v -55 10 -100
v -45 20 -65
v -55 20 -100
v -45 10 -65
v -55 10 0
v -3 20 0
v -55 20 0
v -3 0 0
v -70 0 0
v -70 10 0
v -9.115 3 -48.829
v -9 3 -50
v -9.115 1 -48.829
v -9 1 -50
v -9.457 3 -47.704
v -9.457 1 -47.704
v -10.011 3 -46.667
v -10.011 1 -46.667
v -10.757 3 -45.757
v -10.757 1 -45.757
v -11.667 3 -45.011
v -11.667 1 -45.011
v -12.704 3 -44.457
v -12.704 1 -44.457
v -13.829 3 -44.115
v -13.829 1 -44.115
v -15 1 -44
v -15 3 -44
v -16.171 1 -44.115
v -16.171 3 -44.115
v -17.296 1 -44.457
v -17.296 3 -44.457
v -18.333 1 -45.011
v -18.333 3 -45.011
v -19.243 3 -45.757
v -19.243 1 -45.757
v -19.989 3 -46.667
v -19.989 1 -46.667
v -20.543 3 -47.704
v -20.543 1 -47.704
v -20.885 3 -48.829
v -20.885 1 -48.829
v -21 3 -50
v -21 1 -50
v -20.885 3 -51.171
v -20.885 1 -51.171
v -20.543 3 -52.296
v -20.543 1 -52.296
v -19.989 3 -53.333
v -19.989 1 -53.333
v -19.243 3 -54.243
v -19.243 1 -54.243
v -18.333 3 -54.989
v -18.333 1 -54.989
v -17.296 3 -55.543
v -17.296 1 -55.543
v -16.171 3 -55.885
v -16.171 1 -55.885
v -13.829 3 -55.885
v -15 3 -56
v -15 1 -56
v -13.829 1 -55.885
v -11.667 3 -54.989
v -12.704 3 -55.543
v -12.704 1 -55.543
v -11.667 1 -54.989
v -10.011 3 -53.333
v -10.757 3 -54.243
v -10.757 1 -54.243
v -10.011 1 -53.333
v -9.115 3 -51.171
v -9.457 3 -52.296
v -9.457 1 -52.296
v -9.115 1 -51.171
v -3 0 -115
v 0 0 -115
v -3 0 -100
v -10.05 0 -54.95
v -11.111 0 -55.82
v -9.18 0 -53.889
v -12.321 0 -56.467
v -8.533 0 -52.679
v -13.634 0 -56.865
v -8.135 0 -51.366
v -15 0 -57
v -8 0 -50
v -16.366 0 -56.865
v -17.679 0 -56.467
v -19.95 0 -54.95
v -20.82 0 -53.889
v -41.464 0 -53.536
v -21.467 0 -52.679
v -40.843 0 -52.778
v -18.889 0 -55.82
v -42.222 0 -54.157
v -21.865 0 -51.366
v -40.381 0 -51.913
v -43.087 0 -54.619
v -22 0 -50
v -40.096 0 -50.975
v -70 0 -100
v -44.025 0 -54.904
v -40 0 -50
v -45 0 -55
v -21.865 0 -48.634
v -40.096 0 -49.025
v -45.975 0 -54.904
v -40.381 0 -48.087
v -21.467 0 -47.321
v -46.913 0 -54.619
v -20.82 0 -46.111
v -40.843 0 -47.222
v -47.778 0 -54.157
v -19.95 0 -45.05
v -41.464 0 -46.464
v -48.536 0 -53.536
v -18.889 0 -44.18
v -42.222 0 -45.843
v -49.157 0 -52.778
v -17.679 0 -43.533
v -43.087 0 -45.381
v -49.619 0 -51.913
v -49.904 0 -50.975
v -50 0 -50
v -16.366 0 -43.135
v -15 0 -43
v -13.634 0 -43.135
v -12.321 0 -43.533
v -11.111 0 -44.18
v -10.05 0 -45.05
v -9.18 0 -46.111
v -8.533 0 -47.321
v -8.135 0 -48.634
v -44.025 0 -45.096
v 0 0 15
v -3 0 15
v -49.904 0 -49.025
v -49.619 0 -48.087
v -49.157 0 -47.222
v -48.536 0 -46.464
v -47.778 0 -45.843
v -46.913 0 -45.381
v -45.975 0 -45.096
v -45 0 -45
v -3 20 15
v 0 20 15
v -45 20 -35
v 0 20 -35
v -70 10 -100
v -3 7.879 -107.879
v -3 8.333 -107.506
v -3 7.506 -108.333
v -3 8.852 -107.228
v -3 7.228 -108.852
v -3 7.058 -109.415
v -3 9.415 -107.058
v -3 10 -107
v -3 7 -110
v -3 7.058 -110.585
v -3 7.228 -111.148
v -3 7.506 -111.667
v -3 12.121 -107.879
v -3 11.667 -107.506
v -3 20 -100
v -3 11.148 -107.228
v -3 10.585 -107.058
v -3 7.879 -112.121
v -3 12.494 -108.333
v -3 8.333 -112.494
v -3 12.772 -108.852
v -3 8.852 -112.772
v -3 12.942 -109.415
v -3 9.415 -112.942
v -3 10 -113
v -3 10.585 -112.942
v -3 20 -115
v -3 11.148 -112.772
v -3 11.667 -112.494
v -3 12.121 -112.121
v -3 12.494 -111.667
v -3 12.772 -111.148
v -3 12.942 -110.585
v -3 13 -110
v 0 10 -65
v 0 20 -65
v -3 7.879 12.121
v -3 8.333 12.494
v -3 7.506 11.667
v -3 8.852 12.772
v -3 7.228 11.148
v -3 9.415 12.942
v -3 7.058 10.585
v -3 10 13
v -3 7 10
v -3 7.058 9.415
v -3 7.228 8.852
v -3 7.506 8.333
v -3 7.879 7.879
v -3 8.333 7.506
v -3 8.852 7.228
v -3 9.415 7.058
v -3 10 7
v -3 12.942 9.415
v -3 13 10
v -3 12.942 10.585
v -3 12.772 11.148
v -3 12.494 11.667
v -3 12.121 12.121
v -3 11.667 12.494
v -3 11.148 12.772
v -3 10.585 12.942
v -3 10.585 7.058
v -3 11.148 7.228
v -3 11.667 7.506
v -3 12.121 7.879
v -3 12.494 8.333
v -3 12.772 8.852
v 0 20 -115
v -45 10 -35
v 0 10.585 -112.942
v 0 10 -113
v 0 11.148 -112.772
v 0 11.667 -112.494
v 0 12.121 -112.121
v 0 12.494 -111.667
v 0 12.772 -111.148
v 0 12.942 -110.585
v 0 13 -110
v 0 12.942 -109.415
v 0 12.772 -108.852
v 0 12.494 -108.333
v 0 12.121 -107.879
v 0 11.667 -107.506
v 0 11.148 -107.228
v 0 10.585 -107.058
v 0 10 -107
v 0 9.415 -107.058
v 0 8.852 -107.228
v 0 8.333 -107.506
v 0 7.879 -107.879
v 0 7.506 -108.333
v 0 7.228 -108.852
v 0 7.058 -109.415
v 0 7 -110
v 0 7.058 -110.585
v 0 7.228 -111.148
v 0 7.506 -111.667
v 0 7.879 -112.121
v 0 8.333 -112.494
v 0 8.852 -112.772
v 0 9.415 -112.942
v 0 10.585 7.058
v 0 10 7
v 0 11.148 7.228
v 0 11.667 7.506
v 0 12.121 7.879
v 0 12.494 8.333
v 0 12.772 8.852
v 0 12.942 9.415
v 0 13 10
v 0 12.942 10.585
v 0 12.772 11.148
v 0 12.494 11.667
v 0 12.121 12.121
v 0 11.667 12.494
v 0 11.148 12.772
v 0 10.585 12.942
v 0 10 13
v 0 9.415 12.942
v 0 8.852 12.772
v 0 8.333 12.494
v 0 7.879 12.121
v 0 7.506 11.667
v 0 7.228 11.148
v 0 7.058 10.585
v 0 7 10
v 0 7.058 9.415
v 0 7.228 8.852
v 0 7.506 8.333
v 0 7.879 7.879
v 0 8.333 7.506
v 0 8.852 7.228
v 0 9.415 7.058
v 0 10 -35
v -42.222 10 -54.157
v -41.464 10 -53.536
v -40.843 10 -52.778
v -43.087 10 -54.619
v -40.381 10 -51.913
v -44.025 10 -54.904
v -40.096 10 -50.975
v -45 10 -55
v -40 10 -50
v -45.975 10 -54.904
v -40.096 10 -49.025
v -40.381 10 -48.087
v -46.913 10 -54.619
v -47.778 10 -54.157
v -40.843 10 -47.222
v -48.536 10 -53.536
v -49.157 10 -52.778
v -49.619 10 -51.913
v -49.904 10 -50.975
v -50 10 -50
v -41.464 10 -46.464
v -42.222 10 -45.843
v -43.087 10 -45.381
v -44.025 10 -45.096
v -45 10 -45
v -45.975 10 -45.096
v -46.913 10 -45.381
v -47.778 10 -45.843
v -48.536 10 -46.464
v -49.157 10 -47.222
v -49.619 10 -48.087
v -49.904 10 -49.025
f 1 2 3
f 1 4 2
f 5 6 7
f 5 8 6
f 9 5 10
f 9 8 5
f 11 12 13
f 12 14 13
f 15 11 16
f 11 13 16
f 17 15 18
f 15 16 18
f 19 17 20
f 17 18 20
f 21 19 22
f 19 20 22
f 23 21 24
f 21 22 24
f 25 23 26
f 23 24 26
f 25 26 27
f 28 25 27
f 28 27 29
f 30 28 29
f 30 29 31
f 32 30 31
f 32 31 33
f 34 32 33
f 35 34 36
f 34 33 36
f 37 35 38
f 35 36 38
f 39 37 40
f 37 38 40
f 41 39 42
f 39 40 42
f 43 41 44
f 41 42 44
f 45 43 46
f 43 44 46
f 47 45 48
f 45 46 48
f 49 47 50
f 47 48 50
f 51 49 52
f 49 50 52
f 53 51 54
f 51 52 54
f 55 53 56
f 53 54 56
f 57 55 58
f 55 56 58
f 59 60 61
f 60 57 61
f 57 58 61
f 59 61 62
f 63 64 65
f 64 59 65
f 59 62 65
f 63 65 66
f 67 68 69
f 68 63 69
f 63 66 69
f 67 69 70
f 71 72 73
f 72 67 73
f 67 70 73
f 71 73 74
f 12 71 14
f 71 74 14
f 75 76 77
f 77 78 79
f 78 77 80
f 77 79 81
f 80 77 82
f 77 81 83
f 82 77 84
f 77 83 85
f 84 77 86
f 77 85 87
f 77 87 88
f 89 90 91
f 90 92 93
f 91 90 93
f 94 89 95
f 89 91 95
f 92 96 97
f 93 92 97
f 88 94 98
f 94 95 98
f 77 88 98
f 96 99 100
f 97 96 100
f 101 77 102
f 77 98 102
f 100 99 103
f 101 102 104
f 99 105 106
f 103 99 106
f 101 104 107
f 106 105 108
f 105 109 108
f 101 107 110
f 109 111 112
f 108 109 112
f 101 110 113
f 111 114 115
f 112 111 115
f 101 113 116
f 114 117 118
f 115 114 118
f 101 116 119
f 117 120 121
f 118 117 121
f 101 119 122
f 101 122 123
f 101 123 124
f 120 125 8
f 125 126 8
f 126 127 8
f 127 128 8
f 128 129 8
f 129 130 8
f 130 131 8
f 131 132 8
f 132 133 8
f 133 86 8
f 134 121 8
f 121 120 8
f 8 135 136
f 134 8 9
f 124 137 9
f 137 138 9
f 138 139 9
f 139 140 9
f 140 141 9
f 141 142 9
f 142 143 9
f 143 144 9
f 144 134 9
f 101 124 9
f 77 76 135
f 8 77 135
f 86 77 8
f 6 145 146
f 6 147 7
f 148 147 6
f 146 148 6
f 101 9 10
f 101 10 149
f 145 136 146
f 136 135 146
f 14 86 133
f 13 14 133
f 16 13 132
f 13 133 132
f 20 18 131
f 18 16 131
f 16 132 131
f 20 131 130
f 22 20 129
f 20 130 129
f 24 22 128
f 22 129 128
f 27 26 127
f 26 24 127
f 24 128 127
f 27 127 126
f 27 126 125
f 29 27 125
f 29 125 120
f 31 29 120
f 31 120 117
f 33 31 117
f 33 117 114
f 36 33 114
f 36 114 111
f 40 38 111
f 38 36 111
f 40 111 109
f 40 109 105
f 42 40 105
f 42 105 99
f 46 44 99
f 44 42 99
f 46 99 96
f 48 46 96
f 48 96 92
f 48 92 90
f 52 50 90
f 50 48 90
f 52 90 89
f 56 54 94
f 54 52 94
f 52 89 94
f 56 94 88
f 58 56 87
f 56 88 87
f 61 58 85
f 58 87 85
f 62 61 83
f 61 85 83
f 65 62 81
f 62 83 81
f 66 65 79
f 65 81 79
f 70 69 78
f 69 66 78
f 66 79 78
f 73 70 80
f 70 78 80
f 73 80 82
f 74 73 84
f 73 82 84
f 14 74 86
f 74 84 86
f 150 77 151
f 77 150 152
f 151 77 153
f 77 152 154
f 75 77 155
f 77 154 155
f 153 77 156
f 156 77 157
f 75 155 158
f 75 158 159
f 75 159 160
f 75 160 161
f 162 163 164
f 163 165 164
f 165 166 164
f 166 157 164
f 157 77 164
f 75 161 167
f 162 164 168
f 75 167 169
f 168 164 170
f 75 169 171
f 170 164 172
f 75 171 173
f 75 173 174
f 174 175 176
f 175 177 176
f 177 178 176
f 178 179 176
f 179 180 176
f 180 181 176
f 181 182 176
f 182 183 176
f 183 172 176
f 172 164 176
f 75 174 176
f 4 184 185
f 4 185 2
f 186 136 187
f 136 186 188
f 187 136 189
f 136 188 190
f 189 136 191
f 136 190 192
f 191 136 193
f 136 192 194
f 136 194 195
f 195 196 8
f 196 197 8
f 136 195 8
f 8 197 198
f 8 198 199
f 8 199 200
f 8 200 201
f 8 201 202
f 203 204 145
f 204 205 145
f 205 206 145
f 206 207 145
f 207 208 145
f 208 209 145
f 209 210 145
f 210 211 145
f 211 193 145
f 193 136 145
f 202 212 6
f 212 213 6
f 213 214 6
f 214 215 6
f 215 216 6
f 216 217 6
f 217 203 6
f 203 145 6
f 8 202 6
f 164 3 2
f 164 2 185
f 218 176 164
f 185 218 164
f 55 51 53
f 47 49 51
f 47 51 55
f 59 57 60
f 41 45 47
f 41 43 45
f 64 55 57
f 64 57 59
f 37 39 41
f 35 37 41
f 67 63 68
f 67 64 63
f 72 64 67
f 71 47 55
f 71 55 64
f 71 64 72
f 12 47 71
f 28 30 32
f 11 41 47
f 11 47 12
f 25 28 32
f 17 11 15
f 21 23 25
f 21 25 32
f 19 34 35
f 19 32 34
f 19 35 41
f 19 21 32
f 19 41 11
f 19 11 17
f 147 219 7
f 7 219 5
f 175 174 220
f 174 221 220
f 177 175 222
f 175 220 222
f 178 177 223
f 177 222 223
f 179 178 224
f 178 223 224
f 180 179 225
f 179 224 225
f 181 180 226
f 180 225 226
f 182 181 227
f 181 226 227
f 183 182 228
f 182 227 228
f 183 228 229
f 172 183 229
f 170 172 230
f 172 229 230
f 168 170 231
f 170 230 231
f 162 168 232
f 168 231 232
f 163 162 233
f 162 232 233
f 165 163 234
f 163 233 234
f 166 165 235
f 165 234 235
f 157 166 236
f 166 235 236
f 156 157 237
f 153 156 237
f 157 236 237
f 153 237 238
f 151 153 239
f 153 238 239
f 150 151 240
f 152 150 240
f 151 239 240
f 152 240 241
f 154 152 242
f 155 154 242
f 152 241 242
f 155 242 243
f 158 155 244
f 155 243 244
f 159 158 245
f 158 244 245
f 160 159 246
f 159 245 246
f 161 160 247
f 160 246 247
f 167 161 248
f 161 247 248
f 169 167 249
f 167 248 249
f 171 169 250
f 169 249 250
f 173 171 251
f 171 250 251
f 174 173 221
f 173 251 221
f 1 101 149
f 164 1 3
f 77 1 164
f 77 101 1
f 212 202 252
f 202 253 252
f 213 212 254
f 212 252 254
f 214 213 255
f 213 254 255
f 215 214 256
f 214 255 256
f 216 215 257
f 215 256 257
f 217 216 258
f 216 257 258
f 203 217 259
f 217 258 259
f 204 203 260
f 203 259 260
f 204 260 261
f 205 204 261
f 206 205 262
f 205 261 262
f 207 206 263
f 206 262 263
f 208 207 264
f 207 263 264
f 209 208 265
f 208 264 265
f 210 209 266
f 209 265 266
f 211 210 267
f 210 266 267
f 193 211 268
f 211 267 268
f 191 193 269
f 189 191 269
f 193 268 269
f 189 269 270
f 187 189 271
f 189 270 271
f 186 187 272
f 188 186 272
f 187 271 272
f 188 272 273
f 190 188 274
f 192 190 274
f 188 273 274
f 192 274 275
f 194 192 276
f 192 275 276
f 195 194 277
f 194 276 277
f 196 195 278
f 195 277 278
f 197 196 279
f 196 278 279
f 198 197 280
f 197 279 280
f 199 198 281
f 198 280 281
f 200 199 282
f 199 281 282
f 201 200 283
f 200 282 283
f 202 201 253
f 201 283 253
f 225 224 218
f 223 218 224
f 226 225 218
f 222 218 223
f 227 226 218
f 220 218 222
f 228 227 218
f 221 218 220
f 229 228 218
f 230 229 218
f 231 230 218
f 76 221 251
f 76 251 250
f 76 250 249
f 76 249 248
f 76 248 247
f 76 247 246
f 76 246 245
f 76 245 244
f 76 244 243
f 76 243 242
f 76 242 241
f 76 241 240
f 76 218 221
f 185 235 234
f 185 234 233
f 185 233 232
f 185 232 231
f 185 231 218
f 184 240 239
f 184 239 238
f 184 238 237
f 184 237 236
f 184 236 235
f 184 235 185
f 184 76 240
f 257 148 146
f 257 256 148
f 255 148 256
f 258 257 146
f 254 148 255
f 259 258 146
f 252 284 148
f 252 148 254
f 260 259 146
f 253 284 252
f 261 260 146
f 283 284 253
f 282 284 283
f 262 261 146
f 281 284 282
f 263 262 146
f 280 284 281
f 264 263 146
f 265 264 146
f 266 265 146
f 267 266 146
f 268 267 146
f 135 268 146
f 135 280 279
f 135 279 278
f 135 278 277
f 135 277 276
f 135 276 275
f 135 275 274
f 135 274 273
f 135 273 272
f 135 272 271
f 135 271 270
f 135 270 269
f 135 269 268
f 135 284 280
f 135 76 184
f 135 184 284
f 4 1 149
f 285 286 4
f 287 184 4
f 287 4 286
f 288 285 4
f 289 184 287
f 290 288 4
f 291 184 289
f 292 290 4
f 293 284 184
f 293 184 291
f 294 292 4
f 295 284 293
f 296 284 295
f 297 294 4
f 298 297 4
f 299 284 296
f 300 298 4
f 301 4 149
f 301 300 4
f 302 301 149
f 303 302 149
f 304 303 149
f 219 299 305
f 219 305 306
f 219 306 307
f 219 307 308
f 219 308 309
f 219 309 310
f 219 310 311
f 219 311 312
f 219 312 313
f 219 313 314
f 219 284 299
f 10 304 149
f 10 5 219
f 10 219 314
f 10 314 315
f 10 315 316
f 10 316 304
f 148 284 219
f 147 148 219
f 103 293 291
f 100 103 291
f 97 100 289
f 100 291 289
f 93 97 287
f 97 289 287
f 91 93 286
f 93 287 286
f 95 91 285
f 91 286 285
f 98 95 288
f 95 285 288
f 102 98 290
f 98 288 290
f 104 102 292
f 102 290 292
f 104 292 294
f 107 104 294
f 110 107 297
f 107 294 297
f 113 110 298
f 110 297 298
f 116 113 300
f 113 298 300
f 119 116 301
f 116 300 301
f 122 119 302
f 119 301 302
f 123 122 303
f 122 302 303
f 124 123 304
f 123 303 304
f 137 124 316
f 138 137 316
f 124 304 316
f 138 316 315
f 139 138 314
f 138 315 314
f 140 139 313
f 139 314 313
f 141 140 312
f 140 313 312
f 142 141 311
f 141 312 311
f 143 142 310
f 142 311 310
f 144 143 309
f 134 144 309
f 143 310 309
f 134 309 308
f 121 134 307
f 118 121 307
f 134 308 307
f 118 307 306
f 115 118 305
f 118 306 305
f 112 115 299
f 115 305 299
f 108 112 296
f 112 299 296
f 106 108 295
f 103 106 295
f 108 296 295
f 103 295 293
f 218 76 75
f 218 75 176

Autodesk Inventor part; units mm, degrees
ref_plane "YZ Plane" through (0, 0, 0) normal (1, 0, 0) x (0, 1, 0)
ref_plane "XZ Plane" through (0, 0, 0) normal (0, 1, 0) x (-1, 0, 0)
ref_plane "XY Plane" through (0, 0, 0) normal (0, 0, 1) x (1, 0, 0)
sketch "Эскиз1" plane through (0, 0, 0) normal (0, 1, 0) x (-1, 0, 0)
  line L0 (0, 0) -> (70, 0)
  line L1 (70, 0) -> (70, -100)
  line L2 (70, -100) -> (0, -100)
  line L3 (0, -100) -> (0, 0)
  dimension "d0" = 70
  dimension "d1" = 100
extrude "Выдавливание1" add sketch "Эскиз1" along normal blind 10
sketch "Эскиз2" plane through (0, 10, 0) normal (0, 1, 0) x (1, 0, 0)
  line L0 (0, 0) -> (0, 100) projected
  line L1 (0, 50) -> (-45, 50)
  circle A0 centre (-45, 50) radius 5
  line L2 (0, 50) -> (0, 65)
  line L3 (0, 65) -> (-45, 65)
  line L4 (0, 50) -> (0, 35)
  line L5 (0, 35) -> (-45, 35)
  line L6 (-45, 50) -> (-70, 50)
  line L7 (-70, 100) -> (-70, 0) projected
  line L8 (-45, 50) -> (5, 50) construction
  line L9 (-45, 50) -> (-52.1103, 25.1139)
  line L10 (-45, 50) -> (15, 50) construction
  line L11 (-45, 50) -> (-52.1103, 74.8861)
  circle A1 centre (-45, 50) radius 9
  line L12 (-45, 65) -> (-55, 100)
  line L13 (-45, 35) -> (-55, 0)
  line L14 (-55, 0) -> (0, 0)
  line L15 (0, 0) -> (0, 100)
  line L16 (0, 100) -> (-55, 100)
  dimension "d4" = 45
  dimension "d5" = 10
  dimension "d6" = 15
  dimension "d7" = 15
  dimension "d13" = 18
  dimension "d19" = 45
  dimension "d49" = 55
  dimension "d50" = 148.109
extrude "Выдавливание2" add sketch "Эскиз2" along normal blind 10 contours L14 L13 L5 L0 | L3 L12 L16 L0
extrude "Выдавливание3" cut sketch "Эскиз2" against normal blind 42.5 contours A0 L9 L1 | L1 L11 A0 | L9 A0 L6 | L6 A0 L11
sketch "Эскиз3" plane through (0, 0, 0) normal (0, -1, 0) x (1, 0, 0)
  circle A0 centre (-45, -50) radius 5 projected
  line L0 (-45, -50) -> (-15, -50)
  circle A1 centre (-15, -50) radius 6
  point P0 (0, 0)
  dimension "d20" = 30
  dimension "d21" = 12
extrude "Выдавливание4" cut sketch "Эскиз3" against normal blind 3 contours A1
chamfer "Фаска1" distance 1 angle 45 1 edges at (-21, 0, -50)
sketch "Эскиз4" plane through (0, 0, 0) normal (1, 0, 0) x (0, 0, -1)
  line L0 (0, 0) -> (0, 20) projected
  line L1 (0, 0) -> (-15, 0)
  line L2 (-15, 0) -> (-15, 20)
  line L3 (-15, 20) -> (0, 20)
  line L4 (0, 20) -> (0, 0)
  line L5 (100, 0) -> (100, 20) projected
  line L6 (100, 0) -> (115, 0)
  line L7 (115, 0) -> (115, 20)
  line L8 (115, 20) -> (100, 20)
  line L9 (100, 20) -> (100, 0)
  line L10 (115, 20) -> (110, 20)
  line L11 (110, 20) -> (110, 10)
  line L12 (110, 10) -> (115, 10)
  line L13 (115, 10) -> (115, 20)
  line L14 (-15, 20) -> (-10, 20)
  line L15 (-10, 20) -> (-10, 10)
  line L16 (-10, 10) -> (-15, 10)
  line L17 (-15, 10) -> (-15, 20)
  circle A0 centre (-10, 10) radius 3
  circle A1 centre (110, 10) radius 3
  line L18 (100, 20) -> (0, 20)
  dimension "d27" = 15
  dimension "d28" = 15
  dimension "d29" = 5
  dimension "d30" = 10
  dimension "d31" = 5
  dimension "d32" = 10
  dimension "d33" = 6
  dimension "d34" = 6
extrude "Выдавливание5" add sketch "Эскиз4" against normal blind 3 contours L1 L2 L16 A0 L15 L3 L0 | L8 L11 A1 L12 L7 L6 L5 | L15 A0 L16 L2 L3 | L8 L7 L12 A1 L11
properties part number "Стенка"
